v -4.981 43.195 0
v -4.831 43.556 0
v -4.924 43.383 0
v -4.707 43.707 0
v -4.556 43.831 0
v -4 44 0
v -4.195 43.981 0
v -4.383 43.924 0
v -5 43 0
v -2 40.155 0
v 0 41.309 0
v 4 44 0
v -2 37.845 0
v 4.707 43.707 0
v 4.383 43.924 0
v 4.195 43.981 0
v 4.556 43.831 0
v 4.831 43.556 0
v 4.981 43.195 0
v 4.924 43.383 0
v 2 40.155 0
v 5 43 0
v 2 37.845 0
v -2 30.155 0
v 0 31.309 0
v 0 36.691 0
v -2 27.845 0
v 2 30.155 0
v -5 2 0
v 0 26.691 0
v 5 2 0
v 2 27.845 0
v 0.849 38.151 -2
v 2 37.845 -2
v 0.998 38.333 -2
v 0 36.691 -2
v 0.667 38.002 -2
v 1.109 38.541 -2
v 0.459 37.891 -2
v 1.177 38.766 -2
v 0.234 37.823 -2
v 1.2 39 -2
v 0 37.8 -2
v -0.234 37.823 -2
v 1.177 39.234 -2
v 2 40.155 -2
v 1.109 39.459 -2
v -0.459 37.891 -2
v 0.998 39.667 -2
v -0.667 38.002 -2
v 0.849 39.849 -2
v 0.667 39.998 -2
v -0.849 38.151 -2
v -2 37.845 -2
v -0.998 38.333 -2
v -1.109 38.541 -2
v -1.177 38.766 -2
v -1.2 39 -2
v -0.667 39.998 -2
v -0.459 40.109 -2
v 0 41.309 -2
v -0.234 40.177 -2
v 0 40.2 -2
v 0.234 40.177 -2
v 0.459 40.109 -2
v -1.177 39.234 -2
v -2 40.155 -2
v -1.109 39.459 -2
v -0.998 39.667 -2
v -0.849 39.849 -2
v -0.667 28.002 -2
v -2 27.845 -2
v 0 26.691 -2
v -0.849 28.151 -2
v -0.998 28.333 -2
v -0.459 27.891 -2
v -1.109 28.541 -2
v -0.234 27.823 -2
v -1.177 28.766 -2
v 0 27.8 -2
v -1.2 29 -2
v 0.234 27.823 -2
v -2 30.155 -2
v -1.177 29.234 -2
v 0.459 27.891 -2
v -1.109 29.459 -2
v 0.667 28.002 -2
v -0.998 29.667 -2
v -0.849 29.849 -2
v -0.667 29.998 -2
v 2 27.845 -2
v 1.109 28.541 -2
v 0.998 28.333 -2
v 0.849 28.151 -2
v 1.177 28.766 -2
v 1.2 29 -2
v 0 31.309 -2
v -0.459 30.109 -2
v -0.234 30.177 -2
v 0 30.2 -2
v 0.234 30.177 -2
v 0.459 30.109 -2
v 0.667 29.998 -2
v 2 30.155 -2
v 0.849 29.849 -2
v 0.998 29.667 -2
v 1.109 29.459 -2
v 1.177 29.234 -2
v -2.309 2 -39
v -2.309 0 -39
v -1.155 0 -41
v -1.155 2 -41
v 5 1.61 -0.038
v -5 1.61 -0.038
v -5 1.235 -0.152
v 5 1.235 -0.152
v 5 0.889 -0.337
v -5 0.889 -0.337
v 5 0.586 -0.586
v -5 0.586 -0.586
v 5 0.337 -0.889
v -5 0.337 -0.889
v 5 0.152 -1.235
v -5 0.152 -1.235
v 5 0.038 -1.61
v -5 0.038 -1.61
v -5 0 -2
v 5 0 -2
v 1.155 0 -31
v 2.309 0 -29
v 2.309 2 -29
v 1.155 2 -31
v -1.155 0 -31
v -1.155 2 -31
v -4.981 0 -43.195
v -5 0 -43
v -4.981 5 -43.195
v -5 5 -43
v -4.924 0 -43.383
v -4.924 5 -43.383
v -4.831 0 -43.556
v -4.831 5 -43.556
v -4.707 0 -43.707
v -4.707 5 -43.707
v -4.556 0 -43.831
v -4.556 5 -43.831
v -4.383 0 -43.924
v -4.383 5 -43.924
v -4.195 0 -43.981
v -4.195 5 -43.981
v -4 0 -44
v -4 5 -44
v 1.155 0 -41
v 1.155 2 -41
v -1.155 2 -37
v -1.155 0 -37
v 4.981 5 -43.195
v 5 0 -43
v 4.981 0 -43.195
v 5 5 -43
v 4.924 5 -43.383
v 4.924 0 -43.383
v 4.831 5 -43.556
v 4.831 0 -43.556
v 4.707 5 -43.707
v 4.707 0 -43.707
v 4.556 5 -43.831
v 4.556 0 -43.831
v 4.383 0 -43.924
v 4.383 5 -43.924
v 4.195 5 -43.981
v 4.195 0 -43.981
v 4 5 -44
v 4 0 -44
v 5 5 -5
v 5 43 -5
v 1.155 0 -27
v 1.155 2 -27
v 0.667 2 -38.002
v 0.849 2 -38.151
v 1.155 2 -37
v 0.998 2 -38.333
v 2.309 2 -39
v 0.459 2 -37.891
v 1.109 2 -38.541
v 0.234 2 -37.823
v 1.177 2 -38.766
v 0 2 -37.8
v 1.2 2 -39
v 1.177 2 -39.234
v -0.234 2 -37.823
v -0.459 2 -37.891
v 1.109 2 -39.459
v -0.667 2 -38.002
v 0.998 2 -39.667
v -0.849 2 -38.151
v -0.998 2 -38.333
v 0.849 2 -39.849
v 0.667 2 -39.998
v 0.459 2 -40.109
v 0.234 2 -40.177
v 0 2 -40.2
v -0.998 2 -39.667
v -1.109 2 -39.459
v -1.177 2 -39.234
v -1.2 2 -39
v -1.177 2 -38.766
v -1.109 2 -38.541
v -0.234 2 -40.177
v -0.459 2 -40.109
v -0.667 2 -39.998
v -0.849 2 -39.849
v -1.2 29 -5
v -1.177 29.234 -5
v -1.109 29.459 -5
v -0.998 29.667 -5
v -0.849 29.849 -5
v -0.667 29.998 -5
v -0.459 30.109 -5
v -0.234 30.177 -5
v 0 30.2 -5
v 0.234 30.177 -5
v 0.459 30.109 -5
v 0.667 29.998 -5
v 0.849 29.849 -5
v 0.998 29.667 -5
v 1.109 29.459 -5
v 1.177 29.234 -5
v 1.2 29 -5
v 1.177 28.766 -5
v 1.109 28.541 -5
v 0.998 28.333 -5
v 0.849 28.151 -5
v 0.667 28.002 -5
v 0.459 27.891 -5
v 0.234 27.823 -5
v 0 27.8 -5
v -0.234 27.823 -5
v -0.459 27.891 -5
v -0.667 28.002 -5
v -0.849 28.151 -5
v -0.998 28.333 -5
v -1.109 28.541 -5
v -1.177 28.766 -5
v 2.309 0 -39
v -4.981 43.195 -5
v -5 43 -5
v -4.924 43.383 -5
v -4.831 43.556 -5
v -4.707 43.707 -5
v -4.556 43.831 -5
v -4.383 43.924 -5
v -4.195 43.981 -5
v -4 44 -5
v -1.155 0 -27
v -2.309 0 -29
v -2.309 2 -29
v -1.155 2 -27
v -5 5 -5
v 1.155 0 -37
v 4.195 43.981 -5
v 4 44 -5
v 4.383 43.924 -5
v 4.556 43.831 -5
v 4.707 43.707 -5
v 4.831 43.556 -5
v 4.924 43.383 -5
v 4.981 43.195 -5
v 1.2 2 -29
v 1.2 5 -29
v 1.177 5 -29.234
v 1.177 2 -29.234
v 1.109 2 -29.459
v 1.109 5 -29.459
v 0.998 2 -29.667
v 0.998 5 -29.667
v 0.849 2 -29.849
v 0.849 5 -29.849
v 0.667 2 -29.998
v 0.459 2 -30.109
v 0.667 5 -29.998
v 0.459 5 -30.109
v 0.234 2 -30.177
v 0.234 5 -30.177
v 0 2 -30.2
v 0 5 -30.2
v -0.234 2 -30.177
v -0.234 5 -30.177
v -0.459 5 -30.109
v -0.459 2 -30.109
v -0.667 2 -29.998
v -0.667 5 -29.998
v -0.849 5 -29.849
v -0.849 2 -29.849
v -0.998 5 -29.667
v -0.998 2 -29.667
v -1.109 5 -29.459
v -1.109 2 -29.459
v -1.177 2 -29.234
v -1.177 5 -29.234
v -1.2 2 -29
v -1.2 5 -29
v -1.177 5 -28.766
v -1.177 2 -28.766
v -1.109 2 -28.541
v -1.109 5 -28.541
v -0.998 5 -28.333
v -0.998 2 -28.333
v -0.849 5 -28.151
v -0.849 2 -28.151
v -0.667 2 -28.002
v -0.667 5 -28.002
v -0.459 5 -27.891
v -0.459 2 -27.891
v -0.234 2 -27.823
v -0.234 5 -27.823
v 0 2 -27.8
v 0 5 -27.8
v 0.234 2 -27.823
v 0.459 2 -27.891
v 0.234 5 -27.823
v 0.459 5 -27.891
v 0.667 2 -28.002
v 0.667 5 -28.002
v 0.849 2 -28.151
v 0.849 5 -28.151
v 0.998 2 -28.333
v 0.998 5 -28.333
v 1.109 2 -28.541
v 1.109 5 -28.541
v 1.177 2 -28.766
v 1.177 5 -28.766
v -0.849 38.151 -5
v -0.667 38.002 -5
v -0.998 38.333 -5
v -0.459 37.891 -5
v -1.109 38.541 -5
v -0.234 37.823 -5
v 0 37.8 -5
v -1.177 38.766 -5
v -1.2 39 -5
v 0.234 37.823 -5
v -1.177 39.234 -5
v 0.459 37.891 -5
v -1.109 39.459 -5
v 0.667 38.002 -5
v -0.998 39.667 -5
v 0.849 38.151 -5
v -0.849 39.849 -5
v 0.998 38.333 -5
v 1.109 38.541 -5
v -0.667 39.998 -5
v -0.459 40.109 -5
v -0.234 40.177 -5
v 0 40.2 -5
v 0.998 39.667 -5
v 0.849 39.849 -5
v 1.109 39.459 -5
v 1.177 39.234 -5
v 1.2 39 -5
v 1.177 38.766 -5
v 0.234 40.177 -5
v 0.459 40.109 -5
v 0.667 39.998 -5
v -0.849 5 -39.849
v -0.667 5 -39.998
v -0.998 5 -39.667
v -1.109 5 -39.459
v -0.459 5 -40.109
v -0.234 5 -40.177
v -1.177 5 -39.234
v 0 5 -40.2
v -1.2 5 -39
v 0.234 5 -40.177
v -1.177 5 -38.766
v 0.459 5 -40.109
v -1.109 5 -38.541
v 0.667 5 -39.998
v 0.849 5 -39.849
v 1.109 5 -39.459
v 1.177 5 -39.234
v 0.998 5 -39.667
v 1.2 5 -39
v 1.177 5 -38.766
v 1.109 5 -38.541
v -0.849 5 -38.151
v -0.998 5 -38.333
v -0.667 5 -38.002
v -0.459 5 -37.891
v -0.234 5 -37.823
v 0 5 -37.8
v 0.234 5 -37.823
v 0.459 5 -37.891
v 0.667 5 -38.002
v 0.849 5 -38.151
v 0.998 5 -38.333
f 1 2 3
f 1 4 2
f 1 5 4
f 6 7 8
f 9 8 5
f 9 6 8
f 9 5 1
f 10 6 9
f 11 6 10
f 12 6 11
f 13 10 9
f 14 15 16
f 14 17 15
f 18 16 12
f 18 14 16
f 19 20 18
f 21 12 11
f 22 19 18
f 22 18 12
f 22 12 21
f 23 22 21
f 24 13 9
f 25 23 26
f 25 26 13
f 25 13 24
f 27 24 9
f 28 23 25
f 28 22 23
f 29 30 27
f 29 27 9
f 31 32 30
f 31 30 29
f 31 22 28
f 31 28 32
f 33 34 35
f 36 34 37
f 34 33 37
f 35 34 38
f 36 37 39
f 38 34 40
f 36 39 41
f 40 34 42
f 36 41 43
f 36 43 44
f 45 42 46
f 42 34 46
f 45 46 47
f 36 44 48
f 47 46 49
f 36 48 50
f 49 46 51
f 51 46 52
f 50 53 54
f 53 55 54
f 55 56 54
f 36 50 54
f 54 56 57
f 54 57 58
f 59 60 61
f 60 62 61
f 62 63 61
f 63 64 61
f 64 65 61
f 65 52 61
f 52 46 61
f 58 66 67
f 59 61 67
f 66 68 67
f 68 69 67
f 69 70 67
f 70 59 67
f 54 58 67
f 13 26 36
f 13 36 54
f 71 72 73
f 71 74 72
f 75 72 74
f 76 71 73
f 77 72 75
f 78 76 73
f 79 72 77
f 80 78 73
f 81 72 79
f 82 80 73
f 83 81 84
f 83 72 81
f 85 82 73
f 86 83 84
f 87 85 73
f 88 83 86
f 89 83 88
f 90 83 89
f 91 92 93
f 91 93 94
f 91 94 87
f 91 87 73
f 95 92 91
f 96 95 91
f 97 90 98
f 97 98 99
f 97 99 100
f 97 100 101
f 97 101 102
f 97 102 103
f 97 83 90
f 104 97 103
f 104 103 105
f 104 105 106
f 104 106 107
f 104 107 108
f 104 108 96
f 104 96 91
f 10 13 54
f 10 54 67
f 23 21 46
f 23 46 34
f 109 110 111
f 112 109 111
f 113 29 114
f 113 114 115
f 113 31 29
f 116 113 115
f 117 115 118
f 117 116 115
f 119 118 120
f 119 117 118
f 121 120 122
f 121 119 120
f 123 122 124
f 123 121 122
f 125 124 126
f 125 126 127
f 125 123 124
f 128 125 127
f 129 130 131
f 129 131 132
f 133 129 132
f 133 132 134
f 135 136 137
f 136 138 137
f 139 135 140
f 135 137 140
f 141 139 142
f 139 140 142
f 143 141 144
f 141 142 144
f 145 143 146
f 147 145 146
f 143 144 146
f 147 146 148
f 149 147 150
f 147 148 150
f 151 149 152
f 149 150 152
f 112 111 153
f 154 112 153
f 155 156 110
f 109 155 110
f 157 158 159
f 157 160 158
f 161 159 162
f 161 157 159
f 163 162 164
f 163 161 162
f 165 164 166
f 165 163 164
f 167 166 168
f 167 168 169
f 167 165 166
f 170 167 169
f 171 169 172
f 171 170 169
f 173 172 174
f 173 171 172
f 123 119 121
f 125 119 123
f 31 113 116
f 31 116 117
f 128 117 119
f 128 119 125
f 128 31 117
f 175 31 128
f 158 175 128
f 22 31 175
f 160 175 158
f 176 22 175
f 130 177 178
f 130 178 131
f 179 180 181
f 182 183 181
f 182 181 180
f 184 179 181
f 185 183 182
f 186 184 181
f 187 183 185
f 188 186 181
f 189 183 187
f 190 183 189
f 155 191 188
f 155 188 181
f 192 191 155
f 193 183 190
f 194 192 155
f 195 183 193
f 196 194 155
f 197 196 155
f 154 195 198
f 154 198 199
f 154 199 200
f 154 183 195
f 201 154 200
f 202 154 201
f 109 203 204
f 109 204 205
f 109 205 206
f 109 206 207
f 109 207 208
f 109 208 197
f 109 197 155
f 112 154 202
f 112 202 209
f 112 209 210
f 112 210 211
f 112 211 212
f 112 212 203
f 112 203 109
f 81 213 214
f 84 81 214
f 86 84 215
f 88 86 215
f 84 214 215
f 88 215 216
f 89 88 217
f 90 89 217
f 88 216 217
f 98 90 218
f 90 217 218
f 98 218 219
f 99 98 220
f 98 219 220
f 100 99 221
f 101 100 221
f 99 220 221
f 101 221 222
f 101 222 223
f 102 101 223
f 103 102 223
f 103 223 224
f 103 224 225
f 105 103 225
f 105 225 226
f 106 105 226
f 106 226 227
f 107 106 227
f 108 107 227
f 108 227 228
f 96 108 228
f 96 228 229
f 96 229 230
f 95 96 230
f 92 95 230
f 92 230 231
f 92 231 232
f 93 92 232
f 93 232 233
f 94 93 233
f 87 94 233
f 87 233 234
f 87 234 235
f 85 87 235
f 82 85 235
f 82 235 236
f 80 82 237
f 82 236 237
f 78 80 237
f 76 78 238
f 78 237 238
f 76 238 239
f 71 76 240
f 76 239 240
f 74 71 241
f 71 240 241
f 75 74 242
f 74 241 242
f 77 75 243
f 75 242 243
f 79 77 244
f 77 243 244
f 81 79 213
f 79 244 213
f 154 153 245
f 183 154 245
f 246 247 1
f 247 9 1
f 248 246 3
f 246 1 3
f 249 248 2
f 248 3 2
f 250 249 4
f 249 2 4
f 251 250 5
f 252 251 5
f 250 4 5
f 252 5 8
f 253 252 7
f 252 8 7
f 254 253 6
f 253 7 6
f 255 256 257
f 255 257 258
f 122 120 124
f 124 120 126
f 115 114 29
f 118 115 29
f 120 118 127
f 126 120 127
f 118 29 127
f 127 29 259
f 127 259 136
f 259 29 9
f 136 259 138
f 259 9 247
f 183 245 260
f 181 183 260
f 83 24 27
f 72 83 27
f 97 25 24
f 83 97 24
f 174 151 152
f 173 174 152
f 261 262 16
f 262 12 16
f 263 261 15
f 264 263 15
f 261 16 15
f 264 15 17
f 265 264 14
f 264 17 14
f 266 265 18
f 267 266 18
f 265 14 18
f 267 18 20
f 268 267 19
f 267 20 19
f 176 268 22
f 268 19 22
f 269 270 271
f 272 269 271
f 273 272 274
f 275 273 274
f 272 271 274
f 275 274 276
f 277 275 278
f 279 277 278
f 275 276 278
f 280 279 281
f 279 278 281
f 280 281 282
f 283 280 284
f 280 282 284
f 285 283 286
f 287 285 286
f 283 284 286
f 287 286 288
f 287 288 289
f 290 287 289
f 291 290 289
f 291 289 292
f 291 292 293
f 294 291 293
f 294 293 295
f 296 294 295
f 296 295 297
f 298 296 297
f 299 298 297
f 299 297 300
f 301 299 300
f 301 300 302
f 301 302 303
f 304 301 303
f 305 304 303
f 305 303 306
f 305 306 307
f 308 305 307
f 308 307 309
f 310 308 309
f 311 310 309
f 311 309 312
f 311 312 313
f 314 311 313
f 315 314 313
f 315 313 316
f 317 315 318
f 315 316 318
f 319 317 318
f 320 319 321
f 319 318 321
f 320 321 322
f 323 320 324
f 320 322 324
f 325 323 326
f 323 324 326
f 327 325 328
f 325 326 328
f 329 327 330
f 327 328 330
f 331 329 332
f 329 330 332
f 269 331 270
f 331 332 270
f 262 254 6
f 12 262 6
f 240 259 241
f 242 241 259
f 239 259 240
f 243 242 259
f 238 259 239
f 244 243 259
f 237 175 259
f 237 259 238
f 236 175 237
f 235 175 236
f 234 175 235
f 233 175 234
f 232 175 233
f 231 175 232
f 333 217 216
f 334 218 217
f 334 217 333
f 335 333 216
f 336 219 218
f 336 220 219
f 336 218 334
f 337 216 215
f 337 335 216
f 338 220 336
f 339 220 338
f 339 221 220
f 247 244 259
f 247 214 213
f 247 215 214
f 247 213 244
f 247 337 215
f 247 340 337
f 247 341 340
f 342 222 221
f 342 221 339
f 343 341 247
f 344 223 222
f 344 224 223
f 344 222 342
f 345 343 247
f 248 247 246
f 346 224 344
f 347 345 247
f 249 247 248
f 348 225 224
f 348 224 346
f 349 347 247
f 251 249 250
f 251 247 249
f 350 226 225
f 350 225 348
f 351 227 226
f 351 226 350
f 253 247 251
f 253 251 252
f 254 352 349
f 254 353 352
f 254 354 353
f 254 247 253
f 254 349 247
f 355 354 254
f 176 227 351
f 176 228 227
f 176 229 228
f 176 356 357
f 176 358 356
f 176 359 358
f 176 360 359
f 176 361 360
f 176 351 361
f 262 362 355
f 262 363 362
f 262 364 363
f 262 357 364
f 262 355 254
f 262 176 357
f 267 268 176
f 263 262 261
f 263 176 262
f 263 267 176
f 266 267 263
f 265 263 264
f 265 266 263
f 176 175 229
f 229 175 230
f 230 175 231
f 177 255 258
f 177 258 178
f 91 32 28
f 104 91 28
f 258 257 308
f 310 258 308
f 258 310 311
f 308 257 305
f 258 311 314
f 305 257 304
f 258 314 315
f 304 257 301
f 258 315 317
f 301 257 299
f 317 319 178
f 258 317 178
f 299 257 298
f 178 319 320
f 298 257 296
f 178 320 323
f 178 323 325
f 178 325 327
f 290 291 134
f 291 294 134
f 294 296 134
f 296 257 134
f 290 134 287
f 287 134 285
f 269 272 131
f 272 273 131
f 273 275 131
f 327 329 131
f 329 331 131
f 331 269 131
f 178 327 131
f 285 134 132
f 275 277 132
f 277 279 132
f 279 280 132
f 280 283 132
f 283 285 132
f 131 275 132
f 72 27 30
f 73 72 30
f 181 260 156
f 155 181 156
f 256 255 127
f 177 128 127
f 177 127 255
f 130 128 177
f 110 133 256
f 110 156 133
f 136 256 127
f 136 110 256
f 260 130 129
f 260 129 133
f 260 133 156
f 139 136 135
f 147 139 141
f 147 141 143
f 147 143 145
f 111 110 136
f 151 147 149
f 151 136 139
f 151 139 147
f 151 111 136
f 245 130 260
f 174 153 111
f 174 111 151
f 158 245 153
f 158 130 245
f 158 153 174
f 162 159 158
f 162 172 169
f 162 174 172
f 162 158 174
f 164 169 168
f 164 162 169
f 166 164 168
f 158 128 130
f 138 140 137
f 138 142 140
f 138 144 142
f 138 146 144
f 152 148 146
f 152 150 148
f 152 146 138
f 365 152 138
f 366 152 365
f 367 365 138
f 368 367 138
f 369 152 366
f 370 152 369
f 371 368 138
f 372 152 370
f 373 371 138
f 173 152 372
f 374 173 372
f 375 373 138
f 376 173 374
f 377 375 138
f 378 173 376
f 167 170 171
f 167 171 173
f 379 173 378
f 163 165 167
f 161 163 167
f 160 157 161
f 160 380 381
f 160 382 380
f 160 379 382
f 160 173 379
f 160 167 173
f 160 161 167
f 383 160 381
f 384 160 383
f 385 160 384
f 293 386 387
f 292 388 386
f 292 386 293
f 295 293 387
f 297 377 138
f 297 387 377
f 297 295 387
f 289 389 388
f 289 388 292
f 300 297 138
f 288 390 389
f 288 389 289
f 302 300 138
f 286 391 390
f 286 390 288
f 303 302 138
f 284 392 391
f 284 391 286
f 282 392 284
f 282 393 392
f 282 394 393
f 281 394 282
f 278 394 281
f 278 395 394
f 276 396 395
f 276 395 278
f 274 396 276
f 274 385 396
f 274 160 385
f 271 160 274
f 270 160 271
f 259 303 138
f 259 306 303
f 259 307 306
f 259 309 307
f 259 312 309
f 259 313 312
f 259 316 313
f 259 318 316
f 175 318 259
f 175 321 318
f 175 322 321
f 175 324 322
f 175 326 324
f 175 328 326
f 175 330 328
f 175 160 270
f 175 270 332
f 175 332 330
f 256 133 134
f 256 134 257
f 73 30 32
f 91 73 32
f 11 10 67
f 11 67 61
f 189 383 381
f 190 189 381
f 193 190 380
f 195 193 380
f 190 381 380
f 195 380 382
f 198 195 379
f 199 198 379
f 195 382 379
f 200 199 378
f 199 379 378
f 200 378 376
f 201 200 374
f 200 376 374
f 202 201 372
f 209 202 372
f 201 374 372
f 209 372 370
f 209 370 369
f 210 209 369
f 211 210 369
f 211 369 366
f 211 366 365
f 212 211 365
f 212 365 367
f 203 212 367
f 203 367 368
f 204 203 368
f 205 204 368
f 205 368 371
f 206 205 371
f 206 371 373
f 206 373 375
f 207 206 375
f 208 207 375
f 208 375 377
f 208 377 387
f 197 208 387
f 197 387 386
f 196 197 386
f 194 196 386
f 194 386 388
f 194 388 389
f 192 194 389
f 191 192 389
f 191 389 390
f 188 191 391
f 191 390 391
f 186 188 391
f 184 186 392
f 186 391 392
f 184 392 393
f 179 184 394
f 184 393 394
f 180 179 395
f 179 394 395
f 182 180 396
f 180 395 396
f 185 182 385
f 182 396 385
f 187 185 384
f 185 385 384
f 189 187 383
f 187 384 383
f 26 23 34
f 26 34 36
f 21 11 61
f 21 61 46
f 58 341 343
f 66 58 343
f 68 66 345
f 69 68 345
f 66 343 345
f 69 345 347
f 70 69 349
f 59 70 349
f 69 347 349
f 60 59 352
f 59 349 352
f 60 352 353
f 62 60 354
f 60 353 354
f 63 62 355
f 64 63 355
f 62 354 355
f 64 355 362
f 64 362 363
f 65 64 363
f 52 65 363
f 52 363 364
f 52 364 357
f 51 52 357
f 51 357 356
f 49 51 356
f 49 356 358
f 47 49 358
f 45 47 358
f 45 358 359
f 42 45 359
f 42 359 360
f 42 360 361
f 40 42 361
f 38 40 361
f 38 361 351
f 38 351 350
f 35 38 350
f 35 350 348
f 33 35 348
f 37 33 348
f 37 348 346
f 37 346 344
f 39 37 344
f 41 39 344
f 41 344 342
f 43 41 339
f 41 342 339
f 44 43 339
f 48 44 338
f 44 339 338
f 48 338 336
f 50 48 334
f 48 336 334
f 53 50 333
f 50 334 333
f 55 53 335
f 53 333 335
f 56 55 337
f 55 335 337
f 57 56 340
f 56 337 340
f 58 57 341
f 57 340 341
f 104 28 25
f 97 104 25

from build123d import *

# Parameters (mm, degrees)
EXTRUDE_1_DEPTH      = 5
EXTRUDE_1_DEPTH_BACK = 5
SKETCH_2_R           = 1.2
CUT_EXTRUDE_1_DEPTH  = 60.008473968
SKETCH_3_R           = 1.2
CUT_EXTRUDE_2_DEPTH  = 60.008473968
FILLET_1_R           = 1
FILLET_2_R           = 2
CUT_EXTRUDE1_DEPTH   = 2
CUT_EXTRUDE2_DEPTH   = 2


with BuildPart() as part:
    # Эскиз1 → Бобышка-Вытянуть1 (new, two sides: drawn at the far end of the back side and taken through both)
    with BuildSketch(Plane(origin=(0, 0, 0), x_dir=(0, 0, -1), z_dir=(1, 0, 0)).offset(-EXTRUDE_1_DEPTH_BACK)):
        Polygon((0, 44), (0, 0), (44, 0), (44, 5), (5, 5), (5, 44), align=None)
    extrude(amount=EXTRUDE_1_DEPTH + EXTRUDE_1_DEPTH_BACK)

    # Эскиз2 → Вырез-Вытянуть1 (cut, through all)
    with BuildSketch(Plane(origin=(0, 5, 0), x_dir=(1, 0, 0), z_dir=(0, 1, 0))):
        with Locations((0, 39)):
            Circle(SKETCH_2_R)
        with Locations((0, 29)):
            Circle(SKETCH_2_R)
    extrude(amount=-CUT_EXTRUDE_1_DEPTH, mode=Mode.SUBTRACT)

    # Эскиз3 → Вырез-Вытянуть2 (cut, through all)
    with BuildSketch(Plane(origin=(0, 0, -5), x_dir=(-1, 0, 0), z_dir=(0, 0, -1))):
        with Locations((0, 39)):
            Circle(SKETCH_3_R)
        with Locations((0, 29)):
            Circle(SKETCH_3_R)
    extrude(amount=-CUT_EXTRUDE_2_DEPTH, mode=Mode.SUBTRACT)

    # Скругление1
    fillet_1_edges = [part.edges().sort_by_distance(p)[0] for p in [
        (-5, 2.5, -44),
        (5, 2.5, -44),
        (5, 44, -2.5),
        (-5, 44, -2.5),
    ]]
    fillet(fillet_1_edges, radius=FILLET_1_R)

    # Скругление2
    fillet_2_edges = [part.edges().sort_by_distance(p)[0] for p in [
        (0, 0, 0),
    ]]
    fillet(fillet_2_edges, radius=FILLET_2_R)

    # Sketch1 → Cut-Extrude1 (cut)
    with BuildSketch(Plane(origin=(0, 0, 0), x_dir=(-1, 0, 0), z_dir=(0, 0, -1))):
        Polygon((2, 27.845299462), (0, 26.690598923), (-2, 27.845299462), (-2, 30.154700538), (0, 31.309401077), (2, 30.154700538), align=None)
        Polygon((0, 41.309401077), (-2, 40.154700538), (-2, 37.845299462), (0, 36.690598923), (2, 37.845299462), (2, 40.154700538), align=None)
    extrude(amount=CUT_EXTRUDE1_DEPTH, mode=Mode.SUBTRACT)

    # Sketch2 → Cut-Extrude2 (cut)
    with BuildSketch(Plane(origin=(0, 0, 0), x_dir=(1, 0, 0), z_dir=(0, 1, 0))):
        Polygon((2.309401077, 29), (1.154700538, 31), (-1.154700538, 31), (-2.309401077, 29), (-1.154700538, 27), (1.154700538, 27), align=None)
        Polygon((1.154700538, 41), (2.309401077, 39), (1.154700538, 37), (-1.154700538, 37), (-2.309401077, 39), (-1.154700538, 41), align=None)
    extrude(amount=CUT_EXTRUDE2_DEPTH, mode=Mode.SUBTRACT)


solid = part.part
